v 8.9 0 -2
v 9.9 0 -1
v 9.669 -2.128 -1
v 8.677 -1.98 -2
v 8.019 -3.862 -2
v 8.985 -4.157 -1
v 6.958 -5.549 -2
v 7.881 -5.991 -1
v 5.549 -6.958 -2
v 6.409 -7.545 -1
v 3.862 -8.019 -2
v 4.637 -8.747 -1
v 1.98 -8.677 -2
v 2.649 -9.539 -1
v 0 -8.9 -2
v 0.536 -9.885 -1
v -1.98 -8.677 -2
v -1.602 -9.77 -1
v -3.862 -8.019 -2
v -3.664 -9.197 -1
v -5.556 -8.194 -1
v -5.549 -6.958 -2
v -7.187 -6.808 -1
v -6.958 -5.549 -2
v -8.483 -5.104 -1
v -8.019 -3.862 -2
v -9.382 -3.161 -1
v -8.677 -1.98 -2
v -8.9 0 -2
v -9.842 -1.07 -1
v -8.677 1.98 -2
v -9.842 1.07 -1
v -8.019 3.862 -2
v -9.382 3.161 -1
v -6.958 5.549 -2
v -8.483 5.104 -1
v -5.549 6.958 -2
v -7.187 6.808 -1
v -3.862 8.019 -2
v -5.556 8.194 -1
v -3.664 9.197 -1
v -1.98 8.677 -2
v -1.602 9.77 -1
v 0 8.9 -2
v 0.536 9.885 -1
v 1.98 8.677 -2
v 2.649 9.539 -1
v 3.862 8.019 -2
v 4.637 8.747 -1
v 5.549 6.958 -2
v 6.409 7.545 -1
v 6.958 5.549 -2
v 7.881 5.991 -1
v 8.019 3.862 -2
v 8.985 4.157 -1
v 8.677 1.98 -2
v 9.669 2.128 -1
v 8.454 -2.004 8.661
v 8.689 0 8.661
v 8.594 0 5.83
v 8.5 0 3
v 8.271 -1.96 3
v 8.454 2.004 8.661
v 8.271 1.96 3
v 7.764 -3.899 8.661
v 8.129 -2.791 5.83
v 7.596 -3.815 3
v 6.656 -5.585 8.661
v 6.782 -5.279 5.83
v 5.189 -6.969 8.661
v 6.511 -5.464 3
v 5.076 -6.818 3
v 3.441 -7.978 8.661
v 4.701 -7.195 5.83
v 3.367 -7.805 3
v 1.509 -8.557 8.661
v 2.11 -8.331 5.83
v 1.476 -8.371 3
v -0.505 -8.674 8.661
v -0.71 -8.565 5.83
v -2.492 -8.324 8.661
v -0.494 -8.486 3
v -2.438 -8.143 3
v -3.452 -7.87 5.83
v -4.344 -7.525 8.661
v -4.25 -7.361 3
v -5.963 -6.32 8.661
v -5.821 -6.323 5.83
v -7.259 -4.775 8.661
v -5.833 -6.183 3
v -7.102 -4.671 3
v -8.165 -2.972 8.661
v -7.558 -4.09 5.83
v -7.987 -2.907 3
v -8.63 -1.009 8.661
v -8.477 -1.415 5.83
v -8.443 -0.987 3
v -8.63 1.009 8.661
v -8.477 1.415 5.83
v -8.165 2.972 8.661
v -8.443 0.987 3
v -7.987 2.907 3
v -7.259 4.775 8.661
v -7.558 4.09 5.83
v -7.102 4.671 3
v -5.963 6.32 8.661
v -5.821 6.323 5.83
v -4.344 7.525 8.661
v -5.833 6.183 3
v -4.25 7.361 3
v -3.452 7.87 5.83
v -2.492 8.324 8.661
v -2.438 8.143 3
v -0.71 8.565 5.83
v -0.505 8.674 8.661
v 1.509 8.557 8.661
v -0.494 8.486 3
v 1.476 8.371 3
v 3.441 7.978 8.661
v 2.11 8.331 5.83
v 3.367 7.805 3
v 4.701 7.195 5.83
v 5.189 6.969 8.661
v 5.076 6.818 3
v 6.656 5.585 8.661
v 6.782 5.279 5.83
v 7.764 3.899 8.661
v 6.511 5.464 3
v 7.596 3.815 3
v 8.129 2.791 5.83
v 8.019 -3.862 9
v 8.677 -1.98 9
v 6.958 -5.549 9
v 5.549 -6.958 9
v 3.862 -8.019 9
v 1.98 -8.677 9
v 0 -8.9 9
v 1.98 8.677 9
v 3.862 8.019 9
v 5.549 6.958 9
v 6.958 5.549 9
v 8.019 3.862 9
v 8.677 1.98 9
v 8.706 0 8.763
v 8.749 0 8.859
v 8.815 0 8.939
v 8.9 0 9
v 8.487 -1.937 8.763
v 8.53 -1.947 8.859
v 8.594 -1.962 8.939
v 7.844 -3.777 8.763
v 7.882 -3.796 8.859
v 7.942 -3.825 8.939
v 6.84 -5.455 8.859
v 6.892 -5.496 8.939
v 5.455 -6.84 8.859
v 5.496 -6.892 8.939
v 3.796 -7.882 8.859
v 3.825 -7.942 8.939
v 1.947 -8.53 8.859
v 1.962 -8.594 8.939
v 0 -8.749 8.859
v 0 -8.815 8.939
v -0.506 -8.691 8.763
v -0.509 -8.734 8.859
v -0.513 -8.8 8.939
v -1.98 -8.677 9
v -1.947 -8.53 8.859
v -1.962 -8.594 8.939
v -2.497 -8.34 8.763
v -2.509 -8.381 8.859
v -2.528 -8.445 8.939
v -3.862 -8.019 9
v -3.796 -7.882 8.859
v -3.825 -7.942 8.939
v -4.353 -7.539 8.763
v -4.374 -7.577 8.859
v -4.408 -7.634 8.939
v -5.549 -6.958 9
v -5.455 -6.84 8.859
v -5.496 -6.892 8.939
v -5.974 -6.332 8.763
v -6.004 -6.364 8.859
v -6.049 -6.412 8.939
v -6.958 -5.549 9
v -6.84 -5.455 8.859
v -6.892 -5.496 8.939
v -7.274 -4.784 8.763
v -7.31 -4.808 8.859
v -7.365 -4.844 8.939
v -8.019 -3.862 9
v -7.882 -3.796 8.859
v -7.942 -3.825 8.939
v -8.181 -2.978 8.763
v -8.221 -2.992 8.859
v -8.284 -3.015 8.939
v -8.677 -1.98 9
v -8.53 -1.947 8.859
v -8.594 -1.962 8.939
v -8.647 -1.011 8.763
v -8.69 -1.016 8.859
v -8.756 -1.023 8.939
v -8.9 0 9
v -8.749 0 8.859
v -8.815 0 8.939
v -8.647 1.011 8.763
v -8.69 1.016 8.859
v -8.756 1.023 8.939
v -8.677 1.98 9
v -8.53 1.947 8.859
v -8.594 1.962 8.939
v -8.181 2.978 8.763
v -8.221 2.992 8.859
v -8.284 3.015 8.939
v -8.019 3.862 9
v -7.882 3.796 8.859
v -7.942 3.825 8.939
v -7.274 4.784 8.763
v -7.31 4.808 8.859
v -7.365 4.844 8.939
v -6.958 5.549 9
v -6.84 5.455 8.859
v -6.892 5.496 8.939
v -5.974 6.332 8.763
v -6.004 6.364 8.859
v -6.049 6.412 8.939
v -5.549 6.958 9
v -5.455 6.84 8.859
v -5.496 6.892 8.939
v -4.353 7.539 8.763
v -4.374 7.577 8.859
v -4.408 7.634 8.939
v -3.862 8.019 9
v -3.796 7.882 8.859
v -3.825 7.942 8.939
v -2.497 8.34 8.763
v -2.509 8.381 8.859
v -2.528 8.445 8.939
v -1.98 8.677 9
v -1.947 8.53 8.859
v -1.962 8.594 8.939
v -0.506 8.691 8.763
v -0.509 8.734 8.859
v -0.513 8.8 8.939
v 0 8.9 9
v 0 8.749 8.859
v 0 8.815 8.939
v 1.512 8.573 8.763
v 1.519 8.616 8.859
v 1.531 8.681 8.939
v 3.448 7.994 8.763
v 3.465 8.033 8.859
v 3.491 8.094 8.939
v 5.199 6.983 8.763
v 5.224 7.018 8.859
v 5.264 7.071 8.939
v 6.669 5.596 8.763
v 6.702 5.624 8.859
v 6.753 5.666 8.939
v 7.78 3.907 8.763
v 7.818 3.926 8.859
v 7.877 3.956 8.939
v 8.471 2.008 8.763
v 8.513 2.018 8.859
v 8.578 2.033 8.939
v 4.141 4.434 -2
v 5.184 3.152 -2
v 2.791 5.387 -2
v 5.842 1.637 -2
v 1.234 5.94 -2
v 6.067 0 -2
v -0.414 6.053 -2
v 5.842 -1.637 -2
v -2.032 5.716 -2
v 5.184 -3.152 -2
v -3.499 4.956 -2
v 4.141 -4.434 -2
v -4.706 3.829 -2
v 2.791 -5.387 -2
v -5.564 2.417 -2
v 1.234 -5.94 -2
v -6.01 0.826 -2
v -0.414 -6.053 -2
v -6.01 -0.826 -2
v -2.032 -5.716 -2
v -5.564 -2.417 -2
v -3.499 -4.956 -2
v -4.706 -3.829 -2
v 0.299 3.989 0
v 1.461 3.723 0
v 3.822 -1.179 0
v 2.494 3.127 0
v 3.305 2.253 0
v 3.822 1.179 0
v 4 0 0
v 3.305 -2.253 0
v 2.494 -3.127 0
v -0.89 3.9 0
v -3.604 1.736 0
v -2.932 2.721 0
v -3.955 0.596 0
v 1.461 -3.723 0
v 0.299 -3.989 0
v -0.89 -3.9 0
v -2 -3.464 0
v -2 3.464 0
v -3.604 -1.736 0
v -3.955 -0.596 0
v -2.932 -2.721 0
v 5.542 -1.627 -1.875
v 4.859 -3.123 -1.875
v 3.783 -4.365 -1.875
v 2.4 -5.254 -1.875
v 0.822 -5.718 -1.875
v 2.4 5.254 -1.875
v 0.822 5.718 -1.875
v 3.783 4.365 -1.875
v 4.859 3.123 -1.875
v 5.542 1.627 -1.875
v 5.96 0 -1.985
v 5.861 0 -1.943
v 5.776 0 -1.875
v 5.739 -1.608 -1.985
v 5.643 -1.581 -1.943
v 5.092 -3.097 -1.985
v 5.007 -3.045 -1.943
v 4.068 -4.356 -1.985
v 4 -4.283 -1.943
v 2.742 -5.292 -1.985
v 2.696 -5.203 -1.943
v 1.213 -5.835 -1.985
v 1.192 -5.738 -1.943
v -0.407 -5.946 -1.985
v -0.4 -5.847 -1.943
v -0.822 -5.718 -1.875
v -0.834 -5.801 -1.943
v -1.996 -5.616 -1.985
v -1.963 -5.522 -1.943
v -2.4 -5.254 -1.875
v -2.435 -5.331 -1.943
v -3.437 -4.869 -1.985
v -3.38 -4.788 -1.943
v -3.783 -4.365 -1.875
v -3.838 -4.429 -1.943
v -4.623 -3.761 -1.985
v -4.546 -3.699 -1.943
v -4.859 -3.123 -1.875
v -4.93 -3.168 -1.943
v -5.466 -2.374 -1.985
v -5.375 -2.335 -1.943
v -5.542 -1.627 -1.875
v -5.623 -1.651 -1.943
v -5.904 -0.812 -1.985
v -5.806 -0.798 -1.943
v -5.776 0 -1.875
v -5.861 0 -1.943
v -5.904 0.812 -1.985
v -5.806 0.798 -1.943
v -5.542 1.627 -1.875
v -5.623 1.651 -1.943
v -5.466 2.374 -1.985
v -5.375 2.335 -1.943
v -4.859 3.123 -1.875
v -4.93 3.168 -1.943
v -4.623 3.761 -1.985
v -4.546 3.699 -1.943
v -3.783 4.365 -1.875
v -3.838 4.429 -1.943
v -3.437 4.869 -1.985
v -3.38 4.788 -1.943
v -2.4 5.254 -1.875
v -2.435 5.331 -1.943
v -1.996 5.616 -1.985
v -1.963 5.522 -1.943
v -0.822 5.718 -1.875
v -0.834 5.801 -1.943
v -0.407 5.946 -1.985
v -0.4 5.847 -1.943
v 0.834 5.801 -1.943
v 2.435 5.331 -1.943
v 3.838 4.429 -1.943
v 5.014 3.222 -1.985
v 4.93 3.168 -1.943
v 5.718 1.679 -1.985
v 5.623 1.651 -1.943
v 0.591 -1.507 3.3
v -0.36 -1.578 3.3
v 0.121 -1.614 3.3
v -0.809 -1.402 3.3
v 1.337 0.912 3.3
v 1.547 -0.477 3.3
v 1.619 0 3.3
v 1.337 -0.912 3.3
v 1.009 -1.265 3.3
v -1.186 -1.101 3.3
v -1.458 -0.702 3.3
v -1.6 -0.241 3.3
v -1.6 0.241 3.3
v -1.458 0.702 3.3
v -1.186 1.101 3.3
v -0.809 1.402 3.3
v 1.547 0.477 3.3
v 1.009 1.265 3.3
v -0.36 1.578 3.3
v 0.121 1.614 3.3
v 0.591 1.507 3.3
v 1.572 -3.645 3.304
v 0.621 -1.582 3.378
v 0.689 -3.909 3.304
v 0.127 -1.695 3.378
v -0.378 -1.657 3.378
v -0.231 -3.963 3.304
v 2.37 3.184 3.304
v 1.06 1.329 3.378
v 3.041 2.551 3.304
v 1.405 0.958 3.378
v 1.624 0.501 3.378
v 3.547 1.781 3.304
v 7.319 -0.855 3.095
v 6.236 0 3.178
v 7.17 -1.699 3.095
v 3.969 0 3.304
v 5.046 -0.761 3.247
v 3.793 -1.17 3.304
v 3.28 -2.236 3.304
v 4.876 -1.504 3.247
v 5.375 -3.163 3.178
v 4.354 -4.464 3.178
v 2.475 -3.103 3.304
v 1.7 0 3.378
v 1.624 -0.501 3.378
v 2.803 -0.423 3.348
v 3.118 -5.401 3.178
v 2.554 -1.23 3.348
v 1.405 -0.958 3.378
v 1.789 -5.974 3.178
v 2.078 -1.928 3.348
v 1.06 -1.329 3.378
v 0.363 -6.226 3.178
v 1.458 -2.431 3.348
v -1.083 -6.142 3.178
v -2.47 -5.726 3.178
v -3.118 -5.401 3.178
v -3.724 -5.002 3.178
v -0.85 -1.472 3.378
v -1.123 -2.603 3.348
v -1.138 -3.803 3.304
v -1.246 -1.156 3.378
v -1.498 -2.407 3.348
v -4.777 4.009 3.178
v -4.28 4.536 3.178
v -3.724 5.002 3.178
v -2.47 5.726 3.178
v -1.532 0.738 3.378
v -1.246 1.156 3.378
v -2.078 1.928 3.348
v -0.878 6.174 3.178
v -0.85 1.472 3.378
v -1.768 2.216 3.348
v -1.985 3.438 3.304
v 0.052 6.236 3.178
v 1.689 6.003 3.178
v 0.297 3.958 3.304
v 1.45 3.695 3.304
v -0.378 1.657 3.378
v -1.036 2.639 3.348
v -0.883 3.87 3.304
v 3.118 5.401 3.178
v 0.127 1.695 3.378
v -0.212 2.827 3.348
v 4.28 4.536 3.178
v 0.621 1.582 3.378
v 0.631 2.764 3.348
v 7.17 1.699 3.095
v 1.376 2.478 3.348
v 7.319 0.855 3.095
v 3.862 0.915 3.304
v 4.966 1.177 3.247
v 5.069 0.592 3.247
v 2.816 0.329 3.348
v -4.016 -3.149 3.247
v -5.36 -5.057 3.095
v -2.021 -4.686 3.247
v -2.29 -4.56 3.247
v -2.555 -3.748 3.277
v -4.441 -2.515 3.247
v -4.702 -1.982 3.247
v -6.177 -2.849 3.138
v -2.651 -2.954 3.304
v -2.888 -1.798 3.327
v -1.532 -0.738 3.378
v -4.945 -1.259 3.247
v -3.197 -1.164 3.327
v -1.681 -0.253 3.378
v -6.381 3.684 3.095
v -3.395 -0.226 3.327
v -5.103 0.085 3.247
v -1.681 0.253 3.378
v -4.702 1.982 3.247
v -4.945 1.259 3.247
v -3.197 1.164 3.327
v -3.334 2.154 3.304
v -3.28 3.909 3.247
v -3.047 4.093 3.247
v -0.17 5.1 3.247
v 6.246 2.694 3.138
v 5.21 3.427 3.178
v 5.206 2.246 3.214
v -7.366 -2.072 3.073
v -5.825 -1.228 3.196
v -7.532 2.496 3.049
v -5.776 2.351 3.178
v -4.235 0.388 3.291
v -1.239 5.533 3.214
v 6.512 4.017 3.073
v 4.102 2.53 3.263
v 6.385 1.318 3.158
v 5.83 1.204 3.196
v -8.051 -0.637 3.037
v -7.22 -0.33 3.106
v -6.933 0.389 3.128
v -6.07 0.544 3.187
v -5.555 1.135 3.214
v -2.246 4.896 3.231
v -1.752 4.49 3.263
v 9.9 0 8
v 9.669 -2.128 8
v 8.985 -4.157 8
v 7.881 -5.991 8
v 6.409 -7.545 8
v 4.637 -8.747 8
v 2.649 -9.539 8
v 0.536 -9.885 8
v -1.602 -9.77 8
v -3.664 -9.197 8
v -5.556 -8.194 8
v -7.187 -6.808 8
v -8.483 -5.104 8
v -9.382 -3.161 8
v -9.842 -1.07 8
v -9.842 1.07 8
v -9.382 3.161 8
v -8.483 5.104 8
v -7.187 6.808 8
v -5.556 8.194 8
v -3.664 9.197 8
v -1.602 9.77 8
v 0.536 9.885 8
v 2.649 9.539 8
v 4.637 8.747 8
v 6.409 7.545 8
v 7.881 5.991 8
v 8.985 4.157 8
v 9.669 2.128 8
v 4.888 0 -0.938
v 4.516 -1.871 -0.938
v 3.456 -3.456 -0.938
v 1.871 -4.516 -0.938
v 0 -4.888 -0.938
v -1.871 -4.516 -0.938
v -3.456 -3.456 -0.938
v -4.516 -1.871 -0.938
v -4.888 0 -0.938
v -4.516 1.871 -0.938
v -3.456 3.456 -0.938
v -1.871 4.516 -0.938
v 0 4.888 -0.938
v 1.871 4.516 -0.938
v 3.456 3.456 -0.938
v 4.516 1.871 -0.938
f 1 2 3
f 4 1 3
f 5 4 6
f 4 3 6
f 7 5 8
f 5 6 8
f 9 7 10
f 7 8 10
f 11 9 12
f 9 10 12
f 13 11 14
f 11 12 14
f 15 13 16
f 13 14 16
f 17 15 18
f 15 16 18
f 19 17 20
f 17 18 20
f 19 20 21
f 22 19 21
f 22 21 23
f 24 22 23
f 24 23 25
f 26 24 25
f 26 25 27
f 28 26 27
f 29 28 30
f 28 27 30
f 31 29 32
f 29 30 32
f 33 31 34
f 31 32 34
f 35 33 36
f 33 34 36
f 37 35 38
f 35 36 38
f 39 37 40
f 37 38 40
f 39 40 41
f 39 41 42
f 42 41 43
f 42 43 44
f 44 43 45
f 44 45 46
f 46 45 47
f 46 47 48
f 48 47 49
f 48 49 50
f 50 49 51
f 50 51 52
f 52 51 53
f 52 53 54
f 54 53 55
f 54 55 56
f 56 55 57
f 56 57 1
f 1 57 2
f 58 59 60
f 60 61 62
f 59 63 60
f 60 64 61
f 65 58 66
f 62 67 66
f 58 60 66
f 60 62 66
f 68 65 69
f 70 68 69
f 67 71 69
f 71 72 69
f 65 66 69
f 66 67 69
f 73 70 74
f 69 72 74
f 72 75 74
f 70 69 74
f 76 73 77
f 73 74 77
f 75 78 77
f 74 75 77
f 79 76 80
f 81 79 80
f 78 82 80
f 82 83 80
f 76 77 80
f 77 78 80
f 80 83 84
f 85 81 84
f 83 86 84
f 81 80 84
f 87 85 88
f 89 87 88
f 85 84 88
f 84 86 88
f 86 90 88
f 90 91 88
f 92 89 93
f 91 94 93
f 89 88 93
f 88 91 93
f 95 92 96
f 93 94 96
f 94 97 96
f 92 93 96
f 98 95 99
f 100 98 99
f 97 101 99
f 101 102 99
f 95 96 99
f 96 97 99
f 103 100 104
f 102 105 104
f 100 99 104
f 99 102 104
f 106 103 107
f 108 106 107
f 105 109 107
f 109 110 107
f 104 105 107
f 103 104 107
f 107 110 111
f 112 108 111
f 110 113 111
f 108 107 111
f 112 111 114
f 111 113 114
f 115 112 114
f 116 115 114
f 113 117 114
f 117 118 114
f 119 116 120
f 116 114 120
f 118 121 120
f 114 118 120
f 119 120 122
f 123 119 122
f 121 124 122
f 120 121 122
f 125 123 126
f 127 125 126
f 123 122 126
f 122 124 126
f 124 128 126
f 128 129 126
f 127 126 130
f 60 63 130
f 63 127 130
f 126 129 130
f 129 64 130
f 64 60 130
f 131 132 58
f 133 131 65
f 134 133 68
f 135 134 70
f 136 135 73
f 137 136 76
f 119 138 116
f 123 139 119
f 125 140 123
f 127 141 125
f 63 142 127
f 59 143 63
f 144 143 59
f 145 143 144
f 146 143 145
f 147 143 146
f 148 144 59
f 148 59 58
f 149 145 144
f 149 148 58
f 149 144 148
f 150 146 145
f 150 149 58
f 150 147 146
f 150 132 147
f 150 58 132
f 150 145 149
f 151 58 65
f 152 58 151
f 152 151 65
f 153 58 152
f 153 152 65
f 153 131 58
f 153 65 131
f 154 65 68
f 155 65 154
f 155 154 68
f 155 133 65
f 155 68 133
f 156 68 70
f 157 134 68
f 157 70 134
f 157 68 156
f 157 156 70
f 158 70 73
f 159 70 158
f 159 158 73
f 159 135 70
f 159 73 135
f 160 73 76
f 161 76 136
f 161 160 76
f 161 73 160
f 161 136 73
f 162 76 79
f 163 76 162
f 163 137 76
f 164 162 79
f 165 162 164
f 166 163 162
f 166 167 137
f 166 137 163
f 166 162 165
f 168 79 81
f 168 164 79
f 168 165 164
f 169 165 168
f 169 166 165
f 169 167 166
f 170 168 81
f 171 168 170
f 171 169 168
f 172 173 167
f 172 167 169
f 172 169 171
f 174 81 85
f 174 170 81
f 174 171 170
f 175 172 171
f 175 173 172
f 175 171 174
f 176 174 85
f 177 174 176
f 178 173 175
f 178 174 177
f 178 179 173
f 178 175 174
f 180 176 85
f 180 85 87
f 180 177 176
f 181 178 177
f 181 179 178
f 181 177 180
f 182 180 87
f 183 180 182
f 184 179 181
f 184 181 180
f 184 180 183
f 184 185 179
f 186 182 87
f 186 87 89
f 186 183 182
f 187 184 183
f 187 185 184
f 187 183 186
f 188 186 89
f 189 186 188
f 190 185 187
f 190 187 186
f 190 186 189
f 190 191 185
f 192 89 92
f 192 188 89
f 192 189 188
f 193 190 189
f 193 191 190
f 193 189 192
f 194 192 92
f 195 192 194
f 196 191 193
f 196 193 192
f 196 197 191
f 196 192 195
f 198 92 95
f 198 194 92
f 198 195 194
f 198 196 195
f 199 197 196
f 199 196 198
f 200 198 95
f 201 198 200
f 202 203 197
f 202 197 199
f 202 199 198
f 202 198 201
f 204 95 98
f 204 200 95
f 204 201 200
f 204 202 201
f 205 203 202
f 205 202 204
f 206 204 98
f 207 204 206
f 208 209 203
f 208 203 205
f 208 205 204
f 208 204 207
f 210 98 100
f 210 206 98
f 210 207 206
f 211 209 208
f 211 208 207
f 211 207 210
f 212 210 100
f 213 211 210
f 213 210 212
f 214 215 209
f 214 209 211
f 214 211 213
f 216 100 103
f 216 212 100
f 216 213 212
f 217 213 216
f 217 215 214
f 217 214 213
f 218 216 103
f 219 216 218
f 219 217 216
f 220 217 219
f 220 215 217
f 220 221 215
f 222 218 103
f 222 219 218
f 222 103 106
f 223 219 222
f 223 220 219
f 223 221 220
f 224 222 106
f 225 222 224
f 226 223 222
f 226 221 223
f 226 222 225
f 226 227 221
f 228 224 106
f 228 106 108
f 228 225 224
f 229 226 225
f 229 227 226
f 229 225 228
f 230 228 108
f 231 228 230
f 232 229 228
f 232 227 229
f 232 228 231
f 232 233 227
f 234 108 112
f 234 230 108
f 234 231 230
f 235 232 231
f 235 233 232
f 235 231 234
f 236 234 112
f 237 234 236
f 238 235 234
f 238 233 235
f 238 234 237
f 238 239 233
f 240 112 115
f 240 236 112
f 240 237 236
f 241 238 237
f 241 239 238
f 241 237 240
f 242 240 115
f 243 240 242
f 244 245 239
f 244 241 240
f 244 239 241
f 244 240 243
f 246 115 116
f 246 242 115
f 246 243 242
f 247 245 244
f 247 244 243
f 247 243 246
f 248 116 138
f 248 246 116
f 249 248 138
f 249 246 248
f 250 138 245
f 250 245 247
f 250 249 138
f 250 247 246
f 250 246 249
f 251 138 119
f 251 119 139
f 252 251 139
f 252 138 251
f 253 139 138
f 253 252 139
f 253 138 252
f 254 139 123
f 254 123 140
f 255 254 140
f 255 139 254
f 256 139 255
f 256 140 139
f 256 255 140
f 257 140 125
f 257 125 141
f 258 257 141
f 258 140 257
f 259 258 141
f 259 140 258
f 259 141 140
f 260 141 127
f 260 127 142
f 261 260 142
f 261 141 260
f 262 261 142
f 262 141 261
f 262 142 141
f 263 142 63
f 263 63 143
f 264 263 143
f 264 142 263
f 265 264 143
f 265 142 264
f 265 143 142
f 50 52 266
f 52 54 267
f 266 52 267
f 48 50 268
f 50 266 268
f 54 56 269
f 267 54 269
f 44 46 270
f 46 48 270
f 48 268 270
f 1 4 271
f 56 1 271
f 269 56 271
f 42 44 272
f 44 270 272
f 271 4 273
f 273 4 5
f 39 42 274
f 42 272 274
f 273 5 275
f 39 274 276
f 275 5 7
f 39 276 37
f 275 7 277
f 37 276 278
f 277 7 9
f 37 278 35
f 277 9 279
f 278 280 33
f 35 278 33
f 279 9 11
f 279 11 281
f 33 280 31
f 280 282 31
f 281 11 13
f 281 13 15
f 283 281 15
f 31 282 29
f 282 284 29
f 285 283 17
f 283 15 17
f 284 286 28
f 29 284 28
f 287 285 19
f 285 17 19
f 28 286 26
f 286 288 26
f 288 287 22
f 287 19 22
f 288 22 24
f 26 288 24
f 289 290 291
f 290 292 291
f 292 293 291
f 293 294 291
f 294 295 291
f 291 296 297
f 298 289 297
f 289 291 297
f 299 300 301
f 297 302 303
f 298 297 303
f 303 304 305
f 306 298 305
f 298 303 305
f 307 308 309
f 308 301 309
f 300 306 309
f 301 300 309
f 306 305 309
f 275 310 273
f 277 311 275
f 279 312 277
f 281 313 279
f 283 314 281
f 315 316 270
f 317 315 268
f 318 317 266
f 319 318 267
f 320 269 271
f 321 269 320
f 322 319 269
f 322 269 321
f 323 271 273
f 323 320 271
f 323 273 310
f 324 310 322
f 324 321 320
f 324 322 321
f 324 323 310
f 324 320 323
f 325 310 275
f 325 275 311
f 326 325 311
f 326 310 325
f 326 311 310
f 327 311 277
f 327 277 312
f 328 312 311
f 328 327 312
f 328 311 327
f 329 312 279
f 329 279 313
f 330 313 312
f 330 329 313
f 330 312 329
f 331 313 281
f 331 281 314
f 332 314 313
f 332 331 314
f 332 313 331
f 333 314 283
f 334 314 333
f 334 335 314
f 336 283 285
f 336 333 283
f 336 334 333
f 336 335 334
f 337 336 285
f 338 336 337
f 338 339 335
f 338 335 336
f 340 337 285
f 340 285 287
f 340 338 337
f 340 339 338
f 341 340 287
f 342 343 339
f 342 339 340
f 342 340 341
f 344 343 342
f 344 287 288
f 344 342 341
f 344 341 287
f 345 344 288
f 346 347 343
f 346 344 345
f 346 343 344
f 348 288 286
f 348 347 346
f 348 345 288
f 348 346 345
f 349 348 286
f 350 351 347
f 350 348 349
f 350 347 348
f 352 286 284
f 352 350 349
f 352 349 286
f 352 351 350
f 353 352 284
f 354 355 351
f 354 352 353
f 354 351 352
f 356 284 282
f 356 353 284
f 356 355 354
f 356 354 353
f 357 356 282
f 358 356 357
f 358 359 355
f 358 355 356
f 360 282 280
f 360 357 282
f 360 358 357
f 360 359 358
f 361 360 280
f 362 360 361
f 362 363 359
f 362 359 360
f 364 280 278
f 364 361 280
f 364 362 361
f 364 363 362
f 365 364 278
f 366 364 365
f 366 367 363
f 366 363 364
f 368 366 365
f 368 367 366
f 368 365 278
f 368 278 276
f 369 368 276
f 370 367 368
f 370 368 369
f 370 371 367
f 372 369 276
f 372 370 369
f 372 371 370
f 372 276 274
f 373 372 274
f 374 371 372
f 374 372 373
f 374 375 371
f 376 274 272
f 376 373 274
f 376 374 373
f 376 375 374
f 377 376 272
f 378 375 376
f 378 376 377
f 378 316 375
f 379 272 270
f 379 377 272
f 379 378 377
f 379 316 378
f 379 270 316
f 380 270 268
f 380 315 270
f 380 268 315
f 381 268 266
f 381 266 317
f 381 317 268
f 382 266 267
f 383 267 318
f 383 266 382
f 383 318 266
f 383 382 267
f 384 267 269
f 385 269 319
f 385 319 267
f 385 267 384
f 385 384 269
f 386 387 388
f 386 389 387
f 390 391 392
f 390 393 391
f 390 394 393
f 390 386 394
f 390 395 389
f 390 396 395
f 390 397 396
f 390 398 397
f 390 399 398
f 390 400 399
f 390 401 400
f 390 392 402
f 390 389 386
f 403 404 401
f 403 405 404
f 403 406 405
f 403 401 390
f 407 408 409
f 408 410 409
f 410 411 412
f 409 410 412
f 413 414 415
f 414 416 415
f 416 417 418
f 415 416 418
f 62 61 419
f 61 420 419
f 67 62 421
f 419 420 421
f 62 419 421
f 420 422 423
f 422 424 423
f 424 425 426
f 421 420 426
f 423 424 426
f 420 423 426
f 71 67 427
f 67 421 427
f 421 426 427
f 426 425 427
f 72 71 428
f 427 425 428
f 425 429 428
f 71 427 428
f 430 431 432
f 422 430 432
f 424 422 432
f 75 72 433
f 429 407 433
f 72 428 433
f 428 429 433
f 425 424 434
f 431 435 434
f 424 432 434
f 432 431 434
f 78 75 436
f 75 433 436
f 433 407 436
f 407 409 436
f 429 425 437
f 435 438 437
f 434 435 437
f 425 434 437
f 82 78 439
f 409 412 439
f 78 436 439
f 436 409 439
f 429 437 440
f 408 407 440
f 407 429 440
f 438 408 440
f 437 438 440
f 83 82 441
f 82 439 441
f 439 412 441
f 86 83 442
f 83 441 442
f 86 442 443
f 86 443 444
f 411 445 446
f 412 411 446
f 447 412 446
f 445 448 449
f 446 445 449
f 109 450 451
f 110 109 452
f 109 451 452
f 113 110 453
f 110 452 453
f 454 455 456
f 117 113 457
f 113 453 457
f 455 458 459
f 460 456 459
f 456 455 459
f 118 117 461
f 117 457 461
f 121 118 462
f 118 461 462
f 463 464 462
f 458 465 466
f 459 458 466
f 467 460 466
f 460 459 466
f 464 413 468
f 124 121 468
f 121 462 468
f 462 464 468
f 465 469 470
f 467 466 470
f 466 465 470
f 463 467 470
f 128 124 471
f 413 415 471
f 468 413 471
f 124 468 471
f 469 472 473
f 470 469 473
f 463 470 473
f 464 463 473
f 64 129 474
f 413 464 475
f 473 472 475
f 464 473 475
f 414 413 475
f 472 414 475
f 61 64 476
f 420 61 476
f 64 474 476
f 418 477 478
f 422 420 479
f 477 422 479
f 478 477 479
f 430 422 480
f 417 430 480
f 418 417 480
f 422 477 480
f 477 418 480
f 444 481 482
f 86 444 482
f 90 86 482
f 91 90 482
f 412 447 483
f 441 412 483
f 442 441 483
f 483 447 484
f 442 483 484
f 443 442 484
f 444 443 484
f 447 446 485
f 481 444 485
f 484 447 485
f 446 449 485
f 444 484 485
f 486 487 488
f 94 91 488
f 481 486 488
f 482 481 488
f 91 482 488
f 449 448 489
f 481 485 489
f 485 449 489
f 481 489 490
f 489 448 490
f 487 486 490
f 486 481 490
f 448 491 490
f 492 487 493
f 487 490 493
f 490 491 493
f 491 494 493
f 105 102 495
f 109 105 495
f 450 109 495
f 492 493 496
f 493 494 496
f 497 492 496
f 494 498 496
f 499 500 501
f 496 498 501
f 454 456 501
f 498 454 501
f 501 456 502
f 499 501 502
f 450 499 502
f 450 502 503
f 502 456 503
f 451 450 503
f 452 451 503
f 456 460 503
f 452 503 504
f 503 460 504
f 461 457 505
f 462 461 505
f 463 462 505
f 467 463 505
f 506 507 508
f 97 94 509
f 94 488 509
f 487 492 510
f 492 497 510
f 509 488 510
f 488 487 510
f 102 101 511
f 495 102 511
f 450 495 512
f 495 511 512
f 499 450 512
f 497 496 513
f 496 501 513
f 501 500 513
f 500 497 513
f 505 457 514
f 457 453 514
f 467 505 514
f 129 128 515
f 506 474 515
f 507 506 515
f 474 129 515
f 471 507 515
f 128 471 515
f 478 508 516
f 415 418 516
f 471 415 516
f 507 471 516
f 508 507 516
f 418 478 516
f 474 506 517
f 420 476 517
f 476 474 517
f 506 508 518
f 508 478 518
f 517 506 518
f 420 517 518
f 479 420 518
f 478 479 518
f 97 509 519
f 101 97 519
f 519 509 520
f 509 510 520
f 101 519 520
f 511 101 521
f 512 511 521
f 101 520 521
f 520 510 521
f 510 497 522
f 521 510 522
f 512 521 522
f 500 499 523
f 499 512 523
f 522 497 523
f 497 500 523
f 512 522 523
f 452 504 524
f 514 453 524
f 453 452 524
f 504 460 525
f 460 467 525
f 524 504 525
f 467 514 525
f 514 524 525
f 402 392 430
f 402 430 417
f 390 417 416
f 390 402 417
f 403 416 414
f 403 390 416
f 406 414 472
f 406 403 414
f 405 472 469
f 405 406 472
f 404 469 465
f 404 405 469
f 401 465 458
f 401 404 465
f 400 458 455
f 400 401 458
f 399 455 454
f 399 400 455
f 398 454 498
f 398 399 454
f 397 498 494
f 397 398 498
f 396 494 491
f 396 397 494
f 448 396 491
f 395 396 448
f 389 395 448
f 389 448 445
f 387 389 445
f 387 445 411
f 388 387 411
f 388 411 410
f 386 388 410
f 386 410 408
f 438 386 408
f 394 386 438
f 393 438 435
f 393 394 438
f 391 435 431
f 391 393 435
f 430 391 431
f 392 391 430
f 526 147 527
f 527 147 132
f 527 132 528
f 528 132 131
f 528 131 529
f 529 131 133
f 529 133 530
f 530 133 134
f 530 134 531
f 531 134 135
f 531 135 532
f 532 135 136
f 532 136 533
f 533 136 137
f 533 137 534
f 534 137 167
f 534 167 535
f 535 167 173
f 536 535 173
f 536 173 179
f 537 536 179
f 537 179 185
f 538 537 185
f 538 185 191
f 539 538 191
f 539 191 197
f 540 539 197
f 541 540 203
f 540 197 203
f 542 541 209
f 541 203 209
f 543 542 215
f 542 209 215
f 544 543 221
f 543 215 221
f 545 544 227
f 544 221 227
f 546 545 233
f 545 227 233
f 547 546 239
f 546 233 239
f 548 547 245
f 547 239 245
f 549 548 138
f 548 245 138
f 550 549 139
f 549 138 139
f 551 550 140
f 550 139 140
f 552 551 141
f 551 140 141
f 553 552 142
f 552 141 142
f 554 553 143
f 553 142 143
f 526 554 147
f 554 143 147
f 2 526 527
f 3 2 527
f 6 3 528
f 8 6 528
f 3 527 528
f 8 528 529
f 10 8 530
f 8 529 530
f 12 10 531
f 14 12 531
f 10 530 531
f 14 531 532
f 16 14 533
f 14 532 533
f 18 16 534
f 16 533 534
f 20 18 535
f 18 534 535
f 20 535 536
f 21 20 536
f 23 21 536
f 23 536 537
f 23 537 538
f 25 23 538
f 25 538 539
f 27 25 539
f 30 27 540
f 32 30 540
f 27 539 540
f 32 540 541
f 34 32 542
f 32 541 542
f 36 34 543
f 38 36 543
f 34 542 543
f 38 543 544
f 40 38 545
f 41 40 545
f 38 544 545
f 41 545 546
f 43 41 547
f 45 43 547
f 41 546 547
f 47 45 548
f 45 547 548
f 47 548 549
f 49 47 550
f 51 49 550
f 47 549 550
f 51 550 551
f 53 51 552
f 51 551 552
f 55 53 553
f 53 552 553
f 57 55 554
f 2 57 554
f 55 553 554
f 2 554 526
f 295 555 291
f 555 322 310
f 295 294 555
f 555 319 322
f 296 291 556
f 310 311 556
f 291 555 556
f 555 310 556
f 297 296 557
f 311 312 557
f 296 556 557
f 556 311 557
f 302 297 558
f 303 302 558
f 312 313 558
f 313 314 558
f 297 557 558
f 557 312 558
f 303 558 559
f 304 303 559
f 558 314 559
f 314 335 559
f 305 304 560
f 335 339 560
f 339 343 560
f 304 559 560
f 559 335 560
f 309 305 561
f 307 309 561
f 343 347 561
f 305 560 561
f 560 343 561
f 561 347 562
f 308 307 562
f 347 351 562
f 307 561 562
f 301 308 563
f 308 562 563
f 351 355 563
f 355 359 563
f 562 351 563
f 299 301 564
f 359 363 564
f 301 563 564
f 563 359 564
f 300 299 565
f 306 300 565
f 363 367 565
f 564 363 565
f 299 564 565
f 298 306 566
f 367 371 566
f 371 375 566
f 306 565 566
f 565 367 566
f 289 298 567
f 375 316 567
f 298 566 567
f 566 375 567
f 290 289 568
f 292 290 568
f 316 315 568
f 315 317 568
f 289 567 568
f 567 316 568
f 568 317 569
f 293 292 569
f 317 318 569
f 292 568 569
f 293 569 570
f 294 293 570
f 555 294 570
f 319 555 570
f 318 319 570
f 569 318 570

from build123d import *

# Parameters (mm, degrees)
CHAMFER_1_SIZE      = 1
FILLET_1_R          = 0.4
SKETCH_2_R          = 1.5
CUT_EXTRUDE_1_DEPTH = 6.7
CHAMFER_2_SIZE      = 0.2
CHAMFER_2_SIZE_2    = 0.196243157


with BuildPart() as part:
    # 스케치1 → 회전1 (revolve)
    with BuildSketch(Plane(origin=(0, 0, 0), x_dir=(1, 0, 0), z_dir=(0, 1, 0))):
        with BuildLine():
            Line((0, 0), (4, 0))
            Line((4, 0), (5.894700278586023, 2))
            Line((5.894700278586023, 2), (9.9, 2))
            Line((9.9, 2), (9.900000000000002, -9))
            Line((9.900000000000002, -9), (8.700000000000008, -9))
            Line((8.700000000000008, -9), (8.5, -2.999999999999999))
            ThreePointArc((8.5, -2.999999999999999), (4.254277259758997, -3.290891769878769), (0, -3.4000000000000004))
            Line((0, -3.4000000000000004), (0, -3))
            Line((0, -3), (0, 0))
        make_face()
    revolve(axis=Axis((0, 0, 3), (0, 0, -1)))

    # 모따기1
    chamfer_1_edges = [part.edges().sort_by_distance(p)[0] for p in [
        (-9.900000000000002, -1.21e-15, 9),
        (-9.9, -1.21e-15, -2),
    ]]
    chamfer(chamfer_1_edges, length=CHAMFER_1_SIZE)

    # 필렛1
    # the kernel refuses this fillet: 0.4 mm, written as the material it takes off along each edge
    with BuildSketch(Plane(origin=(0, 0, 9), x_dir=(1, 0, 0), z_dir=(0, 1, 0))) as fillet_1_piece_1:
        with BuildLine():
            CenterArc((9.088461478811075, 0.35282045151089214), FILLET_1_R, 181.90915243299636, 59.981635971248124)
            Line((8.688683516019413, 0.3394945194178369), (8.68068795676358, 0.33922800077597515))
            Line((8.68068795676358, 0.33922800077597515), (8.692004440744174, -0.00026651864186178))
            Line((8.692004440744174, -0.00026651864186178), (8.700000000000008, -0.00799999999999912))
            ThreePointArc((8.700000000000008, -0.00799999999999912), (8.800000000000006, -0.00799999999999912), (8.896230770423783, -0.00705640903021099))
            Line((8.896230770423783, -0.00705640903021099), (8.900000000000004, 7.11e-15))
        make_face()
    revolve(axis=Axis((0, 0, 9), (0, 0, -1)), mode=Mode.SUBTRACT)
    with BuildSketch(Plane(origin=(0, 0, -2), x_dir=(1, 0, 0), z_dir=(0, 1, 0))) as fillet_1_piece_2:
        with BuildLine():
            CenterArc((5.894700278586023 + FILLET_1_R * 0.430137532673, -FILLET_1_R), FILLET_1_R, 90, 46.54870972712371)
            Line((5.894700278586023 - FILLET_1_R * 0.295821777418, -FILLET_1_R * 0.312262346464), (5.894700278586023 - FILLET_1_R * 0.31034096362, -FILLET_1_R * 0.298507593393))
            Line((5.894700278586023 - FILLET_1_R * 0.31034096362, -FILLET_1_R * 0.298507593393), (5.894700278586023 - FILLET_1_R * 0.00860275065346, FILLET_1_R * 0.02))
            Line((5.894700278586023 - FILLET_1_R * 0.00860275065346, FILLET_1_R * 0.02), (5.894700278586023 + FILLET_1_R * 0.430137532673, FILLET_1_R * 0.02))
            Line((5.894700278586023 + FILLET_1_R * 0.430137532673, FILLET_1_R * 0.02), (5.894700278586023 + FILLET_1_R * 0.430137532673, 0))
        make_face()
    revolve(axis=Axis((0, 0, -2), (0, 0, -1)), mode=Mode.SUBTRACT)

    # 스케치2 → 컷-돌출1 (cut)
    with BuildSketch(Plane.XY.offset(10)):
        Circle(SKETCH_2_R)
    extrude(amount=-CUT_EXTRUDE_1_DEPTH, mode=Mode.SUBTRACT)

    # 모따기2
    # the kernel refuses this chamfer: 0.2, 0.196243157 mm, written as the material it takes off along each edge
    with BuildSketch(Plane(origin=(6.4671513e-10, -1.09559634e-09, 3.3823067338827144), x_dir=(1.0, 7.303978568468729e-10, 0), z_dir=(7.303978568468729e-10, -1.0, 0))) as chamfer_2_piece_1_section:
        with BuildLine():
            Line((1.4999999993532855 + CHAMFER_2_SIZE * 0.999793216119, -CHAMFER_2_SIZE * 0.0203353141858), (1.4999999993532855 + CHAMFER_2_SIZE_2 * 6.59095382194e-09, -CHAMFER_2_SIZE_2 * 1.00000000151))
            Line((1.4999999993532855 + CHAMFER_2_SIZE_2 * 6.59095382194e-09, -CHAMFER_2_SIZE_2 * 1.00000000151), (1.4999999993532855, 0))
            ThreePointArc((1.4999999993532855, 0), (1.6028067115105318, -0.00204082683161744), (1.4999999993532855 + CHAMFER_2_SIZE * 0.999793216119, -CHAMFER_2_SIZE * 0.0203353141858))
        make_face()
    chamfer_2_piece_1 = revolve(axis=Axis((6.4671513e-10, -1.09559634e-09, 3.3823067338827144), (0, 0, 1)), mode=Mode.PRIVATE)
    chamfer_2_piece_1 = split(chamfer_2_piece_1, bisect_by=Plane(origin=(6.4671513e-10, -1.09559634e-09, 3.3), z_dir=(0, 0, 1)), keep=Keep.TOP, mode=Mode.PRIVATE)
    add(chamfer_2_piece_1, mode=Mode.SUBTRACT)


solid = part.part
